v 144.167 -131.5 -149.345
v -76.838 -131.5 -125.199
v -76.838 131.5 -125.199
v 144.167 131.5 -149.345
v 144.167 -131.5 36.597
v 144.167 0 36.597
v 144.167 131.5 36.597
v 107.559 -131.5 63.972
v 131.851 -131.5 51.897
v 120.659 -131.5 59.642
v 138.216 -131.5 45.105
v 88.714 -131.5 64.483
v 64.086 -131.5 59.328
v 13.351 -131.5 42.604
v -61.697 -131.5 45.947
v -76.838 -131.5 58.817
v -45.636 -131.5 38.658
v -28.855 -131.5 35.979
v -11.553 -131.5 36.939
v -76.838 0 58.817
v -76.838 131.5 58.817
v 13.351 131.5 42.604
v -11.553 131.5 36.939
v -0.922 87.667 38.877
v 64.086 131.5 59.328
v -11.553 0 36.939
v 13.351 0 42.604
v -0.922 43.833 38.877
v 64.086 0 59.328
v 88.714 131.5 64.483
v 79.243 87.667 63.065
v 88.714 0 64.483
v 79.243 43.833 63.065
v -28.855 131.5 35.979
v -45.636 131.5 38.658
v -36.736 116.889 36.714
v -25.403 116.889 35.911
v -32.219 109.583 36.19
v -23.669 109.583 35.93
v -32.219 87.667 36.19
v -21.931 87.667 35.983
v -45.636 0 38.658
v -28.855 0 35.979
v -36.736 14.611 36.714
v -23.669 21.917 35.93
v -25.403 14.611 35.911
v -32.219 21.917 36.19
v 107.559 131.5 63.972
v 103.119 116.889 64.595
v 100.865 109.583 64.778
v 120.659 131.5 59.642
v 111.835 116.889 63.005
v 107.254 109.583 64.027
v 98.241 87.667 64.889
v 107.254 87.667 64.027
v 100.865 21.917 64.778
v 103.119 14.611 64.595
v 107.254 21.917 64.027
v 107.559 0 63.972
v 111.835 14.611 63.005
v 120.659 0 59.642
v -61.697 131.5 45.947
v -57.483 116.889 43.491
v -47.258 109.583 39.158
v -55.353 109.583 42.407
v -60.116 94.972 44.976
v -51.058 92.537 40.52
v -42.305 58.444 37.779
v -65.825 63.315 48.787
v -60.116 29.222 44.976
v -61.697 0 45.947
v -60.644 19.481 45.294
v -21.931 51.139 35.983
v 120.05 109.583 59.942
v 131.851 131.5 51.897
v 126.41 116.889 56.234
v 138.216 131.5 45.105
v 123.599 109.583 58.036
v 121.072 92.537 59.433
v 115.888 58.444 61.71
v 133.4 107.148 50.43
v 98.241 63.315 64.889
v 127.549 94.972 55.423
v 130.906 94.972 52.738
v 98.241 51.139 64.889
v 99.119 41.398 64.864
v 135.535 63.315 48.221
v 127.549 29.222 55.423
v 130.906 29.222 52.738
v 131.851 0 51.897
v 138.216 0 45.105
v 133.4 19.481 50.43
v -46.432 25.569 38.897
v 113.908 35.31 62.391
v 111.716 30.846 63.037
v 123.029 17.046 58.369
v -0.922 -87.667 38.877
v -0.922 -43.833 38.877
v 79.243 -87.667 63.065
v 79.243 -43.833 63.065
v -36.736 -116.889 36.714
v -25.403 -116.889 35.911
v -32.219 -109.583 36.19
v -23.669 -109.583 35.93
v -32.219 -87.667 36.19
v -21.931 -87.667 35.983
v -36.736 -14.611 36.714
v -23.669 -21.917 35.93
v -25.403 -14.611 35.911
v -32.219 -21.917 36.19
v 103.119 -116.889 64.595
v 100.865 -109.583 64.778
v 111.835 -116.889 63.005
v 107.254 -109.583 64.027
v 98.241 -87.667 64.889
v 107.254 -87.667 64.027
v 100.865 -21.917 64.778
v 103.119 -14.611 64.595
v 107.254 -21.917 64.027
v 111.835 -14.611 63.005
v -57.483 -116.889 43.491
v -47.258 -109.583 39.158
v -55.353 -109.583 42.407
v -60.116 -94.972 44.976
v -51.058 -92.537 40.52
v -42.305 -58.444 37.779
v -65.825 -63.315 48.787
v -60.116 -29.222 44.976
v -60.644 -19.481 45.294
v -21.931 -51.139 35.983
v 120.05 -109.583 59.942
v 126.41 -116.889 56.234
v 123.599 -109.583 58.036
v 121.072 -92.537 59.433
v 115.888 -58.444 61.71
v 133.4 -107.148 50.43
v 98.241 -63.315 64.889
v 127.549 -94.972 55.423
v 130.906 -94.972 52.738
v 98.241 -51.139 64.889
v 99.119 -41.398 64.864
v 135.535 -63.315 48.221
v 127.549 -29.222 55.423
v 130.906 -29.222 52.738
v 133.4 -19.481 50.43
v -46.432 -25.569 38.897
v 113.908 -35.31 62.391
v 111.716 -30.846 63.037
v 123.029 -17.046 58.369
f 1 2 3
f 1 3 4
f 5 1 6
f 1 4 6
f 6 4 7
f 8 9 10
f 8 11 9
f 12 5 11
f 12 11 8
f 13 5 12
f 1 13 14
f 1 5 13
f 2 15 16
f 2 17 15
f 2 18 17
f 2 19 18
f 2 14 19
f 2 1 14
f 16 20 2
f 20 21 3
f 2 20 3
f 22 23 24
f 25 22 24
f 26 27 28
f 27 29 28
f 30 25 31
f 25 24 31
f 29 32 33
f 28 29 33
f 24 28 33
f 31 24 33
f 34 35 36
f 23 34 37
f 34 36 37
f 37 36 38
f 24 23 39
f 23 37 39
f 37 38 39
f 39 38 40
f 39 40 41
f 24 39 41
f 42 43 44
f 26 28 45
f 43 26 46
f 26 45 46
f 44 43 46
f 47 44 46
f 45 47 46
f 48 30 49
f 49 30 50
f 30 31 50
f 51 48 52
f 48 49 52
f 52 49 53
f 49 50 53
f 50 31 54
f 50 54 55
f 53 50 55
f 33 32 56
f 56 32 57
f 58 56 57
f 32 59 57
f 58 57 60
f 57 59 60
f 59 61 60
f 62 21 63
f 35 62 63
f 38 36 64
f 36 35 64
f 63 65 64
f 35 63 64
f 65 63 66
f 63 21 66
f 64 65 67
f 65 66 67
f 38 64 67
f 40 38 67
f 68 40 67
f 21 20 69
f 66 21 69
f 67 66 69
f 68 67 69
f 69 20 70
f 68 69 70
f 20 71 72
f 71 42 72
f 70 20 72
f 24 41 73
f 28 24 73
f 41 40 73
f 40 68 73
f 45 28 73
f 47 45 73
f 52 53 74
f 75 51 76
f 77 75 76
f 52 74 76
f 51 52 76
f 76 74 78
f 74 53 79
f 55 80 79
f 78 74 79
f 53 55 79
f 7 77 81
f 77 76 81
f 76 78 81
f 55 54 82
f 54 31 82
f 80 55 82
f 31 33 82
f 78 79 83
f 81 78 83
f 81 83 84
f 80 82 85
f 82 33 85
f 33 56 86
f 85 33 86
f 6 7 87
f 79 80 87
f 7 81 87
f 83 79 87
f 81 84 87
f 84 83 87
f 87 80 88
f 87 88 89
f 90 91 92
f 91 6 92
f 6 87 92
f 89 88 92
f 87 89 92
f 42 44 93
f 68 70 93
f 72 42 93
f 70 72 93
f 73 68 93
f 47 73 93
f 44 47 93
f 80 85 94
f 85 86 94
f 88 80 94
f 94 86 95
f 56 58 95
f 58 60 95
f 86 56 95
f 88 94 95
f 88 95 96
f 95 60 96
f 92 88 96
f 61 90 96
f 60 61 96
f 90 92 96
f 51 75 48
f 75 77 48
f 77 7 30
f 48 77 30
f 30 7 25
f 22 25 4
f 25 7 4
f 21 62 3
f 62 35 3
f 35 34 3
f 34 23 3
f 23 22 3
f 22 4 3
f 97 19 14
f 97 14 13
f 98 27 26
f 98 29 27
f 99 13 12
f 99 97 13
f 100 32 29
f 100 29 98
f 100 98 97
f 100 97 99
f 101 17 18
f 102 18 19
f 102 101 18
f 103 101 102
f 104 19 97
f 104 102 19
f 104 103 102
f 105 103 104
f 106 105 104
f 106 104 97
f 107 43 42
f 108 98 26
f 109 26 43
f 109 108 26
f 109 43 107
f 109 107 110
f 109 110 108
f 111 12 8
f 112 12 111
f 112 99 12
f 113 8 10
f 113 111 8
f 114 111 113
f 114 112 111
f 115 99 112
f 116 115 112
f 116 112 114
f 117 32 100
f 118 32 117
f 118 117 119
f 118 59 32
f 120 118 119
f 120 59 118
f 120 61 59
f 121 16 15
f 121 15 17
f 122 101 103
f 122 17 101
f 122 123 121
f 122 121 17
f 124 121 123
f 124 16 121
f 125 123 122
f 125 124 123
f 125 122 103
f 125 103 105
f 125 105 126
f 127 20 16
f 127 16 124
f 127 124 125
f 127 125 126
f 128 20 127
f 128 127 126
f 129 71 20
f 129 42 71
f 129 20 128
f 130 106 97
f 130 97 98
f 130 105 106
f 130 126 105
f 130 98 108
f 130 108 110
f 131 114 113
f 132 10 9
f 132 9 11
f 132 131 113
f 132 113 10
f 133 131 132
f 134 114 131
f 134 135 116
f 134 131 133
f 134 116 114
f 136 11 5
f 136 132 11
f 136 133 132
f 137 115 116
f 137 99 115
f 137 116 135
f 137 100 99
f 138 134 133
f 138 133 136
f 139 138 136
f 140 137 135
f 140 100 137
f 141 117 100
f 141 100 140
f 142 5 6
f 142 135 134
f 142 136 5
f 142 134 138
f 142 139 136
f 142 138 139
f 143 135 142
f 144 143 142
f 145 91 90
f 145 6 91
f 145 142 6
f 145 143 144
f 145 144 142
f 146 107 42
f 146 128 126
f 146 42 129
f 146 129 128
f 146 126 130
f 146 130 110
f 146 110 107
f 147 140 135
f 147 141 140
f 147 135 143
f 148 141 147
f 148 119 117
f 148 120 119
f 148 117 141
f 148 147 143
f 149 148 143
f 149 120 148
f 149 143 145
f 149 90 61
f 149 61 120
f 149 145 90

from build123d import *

# Parameters (mm, degrees)
EXTRUDE_1_DEPTH = 131.5


with BuildPart() as part:
    # 草图1 → 凸台-拉伸1 (new, symmetric)
    with BuildSketch(Plane(origin=(0, 0, 0), x_dir=(1, 0, 0), z_dir=(0, 1, 0))):
        with BuildLine():
            Line((-76.837904128, -58.81687225), (-76.837904128, 125.19937152))
            Line((-76.837904128, 125.19937152), (144.166689092, 149.345372478))
            Line((144.166689092, 149.345372478), (144.166689092, -36.597164955))
            add(Edge.make_bspline(
                [(-76.837904128, -58.81687225), (-9.541749974, 14.78234011), (93.359068004, -119.986931913), (144.166689092, -36.597164955)],
                knots=[0, 0, 0, 0, 1, 1, 1, 1], degree=3))
        make_face()
    extrude(amount=EXTRUDE_1_DEPTH, both=True)


solid = part.part
